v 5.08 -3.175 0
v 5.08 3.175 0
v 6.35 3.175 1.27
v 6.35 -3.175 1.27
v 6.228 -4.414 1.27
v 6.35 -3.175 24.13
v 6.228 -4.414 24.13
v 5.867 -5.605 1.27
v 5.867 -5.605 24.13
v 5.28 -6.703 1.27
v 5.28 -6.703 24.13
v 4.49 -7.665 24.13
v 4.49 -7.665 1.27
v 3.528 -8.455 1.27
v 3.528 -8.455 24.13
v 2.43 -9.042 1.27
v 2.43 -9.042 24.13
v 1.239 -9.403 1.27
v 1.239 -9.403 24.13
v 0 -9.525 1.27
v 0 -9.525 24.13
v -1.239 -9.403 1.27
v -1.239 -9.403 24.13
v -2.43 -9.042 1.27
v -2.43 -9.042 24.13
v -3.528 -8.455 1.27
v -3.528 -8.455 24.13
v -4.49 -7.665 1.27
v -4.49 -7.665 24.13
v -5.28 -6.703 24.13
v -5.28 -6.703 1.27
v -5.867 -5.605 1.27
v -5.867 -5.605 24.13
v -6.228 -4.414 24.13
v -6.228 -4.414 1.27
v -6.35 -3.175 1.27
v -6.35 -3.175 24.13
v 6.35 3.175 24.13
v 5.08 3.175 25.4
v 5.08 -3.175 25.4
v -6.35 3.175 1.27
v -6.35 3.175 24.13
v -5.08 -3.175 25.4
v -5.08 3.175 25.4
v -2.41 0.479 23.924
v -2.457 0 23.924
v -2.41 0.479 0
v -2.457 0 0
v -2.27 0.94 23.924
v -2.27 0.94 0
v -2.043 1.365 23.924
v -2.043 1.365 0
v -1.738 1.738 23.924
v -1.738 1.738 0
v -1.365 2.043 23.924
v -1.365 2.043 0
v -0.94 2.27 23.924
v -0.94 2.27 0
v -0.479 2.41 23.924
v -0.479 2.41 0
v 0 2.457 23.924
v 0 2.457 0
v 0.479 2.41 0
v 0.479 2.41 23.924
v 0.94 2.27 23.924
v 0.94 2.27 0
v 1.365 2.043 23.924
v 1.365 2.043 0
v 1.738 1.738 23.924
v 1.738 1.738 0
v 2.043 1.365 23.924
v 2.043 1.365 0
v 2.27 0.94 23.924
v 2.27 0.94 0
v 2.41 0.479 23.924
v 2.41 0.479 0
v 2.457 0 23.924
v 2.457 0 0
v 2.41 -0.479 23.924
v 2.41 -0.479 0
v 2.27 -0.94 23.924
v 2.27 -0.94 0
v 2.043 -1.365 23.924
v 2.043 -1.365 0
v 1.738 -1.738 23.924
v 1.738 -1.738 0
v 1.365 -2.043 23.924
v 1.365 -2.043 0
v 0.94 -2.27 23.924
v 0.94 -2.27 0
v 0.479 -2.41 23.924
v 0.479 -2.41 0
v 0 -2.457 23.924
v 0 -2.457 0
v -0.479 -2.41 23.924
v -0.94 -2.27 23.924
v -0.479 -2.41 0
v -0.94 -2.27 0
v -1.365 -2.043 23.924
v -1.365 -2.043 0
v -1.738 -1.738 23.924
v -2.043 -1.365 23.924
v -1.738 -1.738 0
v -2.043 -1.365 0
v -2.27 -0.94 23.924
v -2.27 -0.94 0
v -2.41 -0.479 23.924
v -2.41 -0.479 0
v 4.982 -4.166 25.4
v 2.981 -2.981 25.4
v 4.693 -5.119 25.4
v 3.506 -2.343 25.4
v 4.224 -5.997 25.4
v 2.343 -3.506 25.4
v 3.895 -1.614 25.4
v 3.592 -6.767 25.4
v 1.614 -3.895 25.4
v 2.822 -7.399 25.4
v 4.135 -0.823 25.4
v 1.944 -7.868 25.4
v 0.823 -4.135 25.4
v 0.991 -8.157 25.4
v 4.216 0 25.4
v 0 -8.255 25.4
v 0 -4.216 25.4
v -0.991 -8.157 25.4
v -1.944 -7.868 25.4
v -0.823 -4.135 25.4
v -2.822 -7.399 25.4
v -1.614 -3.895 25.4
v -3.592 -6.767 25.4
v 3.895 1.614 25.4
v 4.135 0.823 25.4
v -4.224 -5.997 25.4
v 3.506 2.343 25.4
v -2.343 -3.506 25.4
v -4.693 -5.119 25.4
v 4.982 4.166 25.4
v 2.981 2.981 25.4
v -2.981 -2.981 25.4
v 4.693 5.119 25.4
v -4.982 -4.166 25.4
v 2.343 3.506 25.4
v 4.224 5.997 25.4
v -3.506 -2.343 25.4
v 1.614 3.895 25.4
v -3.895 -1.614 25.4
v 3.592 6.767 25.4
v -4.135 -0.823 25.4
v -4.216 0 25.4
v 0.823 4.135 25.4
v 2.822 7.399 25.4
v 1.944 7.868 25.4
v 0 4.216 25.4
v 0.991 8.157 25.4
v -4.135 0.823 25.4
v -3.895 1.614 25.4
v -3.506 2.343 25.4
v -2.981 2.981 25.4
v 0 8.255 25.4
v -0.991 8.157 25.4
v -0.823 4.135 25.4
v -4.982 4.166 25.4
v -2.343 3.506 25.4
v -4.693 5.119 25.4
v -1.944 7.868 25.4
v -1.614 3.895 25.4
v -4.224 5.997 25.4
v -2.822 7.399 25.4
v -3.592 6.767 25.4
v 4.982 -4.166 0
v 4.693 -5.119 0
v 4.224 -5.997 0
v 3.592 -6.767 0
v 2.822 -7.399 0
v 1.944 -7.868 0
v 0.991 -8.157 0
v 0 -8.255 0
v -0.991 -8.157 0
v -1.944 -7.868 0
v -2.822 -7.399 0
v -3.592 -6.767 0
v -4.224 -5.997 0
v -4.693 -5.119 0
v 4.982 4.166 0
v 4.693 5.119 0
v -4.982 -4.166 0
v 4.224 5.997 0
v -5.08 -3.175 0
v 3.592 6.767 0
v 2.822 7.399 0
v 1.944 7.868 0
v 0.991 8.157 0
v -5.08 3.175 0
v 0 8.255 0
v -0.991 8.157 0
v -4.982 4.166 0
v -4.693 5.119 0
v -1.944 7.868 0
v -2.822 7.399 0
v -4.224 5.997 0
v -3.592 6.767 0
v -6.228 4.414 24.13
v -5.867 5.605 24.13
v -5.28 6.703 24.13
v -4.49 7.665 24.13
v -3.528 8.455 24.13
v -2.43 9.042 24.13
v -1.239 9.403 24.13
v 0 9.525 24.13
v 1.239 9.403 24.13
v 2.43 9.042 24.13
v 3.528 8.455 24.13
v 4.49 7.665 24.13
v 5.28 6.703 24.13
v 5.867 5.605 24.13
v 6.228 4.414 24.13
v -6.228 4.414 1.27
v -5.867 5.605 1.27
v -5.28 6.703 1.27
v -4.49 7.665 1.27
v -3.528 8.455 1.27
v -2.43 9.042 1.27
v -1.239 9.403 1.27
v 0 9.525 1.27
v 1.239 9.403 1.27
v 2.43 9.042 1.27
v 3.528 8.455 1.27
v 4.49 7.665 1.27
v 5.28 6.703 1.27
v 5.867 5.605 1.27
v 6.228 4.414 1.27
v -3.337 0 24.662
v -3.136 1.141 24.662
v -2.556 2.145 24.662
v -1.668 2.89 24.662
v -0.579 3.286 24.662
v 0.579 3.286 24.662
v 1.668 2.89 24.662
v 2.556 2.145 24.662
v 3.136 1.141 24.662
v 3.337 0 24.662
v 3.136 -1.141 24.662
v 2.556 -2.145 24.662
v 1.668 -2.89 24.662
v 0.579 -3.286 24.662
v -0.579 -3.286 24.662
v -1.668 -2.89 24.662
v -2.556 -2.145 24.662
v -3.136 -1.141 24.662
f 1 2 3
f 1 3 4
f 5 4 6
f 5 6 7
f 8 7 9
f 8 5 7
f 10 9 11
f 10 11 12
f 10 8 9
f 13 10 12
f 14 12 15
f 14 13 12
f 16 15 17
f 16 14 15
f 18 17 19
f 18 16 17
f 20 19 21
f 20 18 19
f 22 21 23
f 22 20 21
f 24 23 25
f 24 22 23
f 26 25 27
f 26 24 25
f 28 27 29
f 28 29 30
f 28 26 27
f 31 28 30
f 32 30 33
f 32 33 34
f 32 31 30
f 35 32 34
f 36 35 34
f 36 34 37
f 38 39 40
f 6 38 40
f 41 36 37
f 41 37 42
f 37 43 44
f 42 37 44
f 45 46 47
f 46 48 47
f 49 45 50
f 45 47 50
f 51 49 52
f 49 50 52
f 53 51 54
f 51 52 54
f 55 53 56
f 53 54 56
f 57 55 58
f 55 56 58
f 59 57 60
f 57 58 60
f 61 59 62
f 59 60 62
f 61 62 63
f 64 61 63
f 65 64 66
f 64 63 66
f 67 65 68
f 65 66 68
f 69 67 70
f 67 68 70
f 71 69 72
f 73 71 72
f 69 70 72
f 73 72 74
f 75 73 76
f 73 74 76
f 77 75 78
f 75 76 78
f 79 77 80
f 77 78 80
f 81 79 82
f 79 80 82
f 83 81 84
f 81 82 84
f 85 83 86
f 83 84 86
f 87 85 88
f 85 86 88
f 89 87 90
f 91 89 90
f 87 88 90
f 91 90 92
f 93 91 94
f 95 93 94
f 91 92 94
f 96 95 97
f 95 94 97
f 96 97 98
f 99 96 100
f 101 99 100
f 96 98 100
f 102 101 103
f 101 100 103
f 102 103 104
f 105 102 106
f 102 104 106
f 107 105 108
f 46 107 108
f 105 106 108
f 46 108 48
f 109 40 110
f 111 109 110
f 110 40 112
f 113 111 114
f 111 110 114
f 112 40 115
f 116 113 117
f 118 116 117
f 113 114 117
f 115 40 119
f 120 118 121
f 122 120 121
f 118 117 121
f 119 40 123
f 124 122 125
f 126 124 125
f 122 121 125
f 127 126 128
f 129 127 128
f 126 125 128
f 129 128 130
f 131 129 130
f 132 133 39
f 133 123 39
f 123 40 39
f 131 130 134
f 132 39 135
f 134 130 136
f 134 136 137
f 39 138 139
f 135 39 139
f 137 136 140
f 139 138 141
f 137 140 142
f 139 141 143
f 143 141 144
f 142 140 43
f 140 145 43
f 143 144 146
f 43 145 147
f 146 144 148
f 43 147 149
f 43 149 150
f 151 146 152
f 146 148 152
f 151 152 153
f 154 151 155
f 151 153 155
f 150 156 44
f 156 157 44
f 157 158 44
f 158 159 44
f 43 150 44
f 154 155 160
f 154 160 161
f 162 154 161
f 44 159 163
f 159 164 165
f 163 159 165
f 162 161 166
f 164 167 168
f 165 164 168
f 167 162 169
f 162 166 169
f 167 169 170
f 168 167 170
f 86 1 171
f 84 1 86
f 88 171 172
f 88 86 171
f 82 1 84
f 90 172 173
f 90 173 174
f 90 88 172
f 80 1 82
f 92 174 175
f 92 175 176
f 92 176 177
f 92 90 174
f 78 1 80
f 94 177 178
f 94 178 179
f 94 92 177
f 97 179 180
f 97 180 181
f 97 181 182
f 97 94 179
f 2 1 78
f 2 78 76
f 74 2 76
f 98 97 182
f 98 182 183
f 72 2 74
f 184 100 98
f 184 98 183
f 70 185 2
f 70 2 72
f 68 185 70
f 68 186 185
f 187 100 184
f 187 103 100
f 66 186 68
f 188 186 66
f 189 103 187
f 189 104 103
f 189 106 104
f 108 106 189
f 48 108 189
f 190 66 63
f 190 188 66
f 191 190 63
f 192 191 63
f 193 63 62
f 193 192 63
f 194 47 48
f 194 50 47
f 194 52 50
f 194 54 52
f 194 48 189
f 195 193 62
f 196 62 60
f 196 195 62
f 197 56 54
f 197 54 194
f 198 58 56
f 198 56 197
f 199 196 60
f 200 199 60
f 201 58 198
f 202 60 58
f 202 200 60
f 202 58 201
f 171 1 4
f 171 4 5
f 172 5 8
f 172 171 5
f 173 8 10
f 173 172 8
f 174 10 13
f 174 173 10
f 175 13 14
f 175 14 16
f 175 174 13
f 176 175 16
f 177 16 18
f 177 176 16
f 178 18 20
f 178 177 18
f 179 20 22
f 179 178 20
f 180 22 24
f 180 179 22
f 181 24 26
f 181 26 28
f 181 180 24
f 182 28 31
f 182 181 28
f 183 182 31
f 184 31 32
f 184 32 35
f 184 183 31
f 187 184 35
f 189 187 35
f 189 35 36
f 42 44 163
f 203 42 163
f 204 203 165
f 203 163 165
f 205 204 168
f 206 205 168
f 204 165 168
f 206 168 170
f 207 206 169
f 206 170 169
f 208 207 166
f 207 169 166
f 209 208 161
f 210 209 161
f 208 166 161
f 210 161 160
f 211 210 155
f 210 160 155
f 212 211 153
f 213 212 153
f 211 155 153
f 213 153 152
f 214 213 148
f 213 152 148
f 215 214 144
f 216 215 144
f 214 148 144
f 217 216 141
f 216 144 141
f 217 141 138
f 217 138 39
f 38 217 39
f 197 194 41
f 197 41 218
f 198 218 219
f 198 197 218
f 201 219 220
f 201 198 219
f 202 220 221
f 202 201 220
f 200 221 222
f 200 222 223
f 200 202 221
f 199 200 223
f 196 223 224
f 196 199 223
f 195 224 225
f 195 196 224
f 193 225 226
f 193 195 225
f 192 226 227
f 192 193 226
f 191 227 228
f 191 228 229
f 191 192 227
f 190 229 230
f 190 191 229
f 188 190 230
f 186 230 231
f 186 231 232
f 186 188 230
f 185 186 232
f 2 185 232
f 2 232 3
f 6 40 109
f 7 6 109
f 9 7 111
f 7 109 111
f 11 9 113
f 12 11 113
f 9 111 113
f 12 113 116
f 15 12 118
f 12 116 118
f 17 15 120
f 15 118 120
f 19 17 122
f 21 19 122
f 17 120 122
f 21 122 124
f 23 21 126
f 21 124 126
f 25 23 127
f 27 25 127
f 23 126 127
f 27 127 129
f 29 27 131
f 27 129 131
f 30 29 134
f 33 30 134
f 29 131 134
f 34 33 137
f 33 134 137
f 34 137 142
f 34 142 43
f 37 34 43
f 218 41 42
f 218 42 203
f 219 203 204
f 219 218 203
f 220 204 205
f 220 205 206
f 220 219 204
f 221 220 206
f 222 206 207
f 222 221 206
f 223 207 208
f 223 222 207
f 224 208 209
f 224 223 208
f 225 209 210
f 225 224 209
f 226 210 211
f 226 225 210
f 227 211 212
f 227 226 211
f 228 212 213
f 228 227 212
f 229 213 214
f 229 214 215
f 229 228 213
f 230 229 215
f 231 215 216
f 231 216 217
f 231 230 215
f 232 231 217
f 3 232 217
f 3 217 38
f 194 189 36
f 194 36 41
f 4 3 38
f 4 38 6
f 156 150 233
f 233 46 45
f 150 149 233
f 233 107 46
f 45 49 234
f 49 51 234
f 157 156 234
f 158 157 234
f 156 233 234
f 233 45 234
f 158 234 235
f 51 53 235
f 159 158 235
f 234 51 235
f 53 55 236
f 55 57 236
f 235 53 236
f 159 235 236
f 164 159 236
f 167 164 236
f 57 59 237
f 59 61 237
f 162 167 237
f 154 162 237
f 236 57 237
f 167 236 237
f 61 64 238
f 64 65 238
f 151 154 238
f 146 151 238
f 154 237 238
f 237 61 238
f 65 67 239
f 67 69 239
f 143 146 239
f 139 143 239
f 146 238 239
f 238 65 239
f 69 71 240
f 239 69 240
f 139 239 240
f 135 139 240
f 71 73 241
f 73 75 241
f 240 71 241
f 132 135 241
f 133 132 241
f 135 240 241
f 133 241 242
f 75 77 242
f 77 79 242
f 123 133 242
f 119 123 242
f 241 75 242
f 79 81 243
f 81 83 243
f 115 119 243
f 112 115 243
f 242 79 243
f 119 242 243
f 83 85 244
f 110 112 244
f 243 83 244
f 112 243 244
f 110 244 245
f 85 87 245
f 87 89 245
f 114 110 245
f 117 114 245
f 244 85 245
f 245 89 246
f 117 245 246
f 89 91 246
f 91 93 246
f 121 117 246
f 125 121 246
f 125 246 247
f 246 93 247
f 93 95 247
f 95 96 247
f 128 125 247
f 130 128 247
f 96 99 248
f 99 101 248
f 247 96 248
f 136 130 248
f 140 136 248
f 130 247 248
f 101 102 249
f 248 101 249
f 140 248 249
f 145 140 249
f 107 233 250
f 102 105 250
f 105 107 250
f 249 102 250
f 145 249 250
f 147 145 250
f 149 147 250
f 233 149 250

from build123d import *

# Parameters (mm, degrees)
BOSS_EXTRUDE1_DEPTH                               = 25.4
CHAMFER1_SIZE                                     = 1.27
CSK_FOR_8_FLAT_HEAD_MACHINE_SCREW_100_D           = 4.9149
CSK_FOR_8_FLAT_HEAD_MACHINE_SCREW_100_CSINK_D     = 8.4328
CSK_FOR_8_FLAT_HEAD_MACHINE_SCREW_100_CSINK_ANGLE = 100


with BuildPart() as part:
    # Sketch1 → Boss-Extrude1 (new body)
    with BuildSketch(Plane.XY):
        with BuildLine():
            Line((-6.35, -3.175), (-6.35, 3.175))
            ThreePointArc((-6.35, 3.175), (0, 9.525), (6.35, 3.175))
            Line((6.35, 3.175), (6.35, -3.175))
            ThreePointArc((6.35, -3.175), (0, -9.525), (-6.35, -3.175))
        make_face()
    extrude(amount=BOSS_EXTRUDE1_DEPTH)

    # Chamfer1
    chamfer1_edges = [part.edges().sort_by_distance(p)[0] for p in [
        (0, 9.525, 25.4),
        (-6.35, 0, 25.4),
        (0, -9.525, 25.4),
        (-6.35, 0, 0),
        (0, 9.525, 0),
        (6.35, 0, 0),
        (0, -9.525, 0),
        (6.35, 0, 25.4),
    ]]
    chamfer(chamfer1_edges, length=CHAMFER1_SIZE)

    # CSK for #8 Flat Head Machine Screw (100)1 (through all)
    with Locations(Plane.XY.offset(25.4)):
        with Locations((0, 0)):
            CounterSinkHole(CSK_FOR_8_FLAT_HEAD_MACHINE_SCREW_100_D / 2, CSK_FOR_8_FLAT_HEAD_MACHINE_SCREW_100_CSINK_D / 2, counter_sink_angle=CSK_FOR_8_FLAT_HEAD_MACHINE_SCREW_100_CSINK_ANGLE)


solid = part.part
